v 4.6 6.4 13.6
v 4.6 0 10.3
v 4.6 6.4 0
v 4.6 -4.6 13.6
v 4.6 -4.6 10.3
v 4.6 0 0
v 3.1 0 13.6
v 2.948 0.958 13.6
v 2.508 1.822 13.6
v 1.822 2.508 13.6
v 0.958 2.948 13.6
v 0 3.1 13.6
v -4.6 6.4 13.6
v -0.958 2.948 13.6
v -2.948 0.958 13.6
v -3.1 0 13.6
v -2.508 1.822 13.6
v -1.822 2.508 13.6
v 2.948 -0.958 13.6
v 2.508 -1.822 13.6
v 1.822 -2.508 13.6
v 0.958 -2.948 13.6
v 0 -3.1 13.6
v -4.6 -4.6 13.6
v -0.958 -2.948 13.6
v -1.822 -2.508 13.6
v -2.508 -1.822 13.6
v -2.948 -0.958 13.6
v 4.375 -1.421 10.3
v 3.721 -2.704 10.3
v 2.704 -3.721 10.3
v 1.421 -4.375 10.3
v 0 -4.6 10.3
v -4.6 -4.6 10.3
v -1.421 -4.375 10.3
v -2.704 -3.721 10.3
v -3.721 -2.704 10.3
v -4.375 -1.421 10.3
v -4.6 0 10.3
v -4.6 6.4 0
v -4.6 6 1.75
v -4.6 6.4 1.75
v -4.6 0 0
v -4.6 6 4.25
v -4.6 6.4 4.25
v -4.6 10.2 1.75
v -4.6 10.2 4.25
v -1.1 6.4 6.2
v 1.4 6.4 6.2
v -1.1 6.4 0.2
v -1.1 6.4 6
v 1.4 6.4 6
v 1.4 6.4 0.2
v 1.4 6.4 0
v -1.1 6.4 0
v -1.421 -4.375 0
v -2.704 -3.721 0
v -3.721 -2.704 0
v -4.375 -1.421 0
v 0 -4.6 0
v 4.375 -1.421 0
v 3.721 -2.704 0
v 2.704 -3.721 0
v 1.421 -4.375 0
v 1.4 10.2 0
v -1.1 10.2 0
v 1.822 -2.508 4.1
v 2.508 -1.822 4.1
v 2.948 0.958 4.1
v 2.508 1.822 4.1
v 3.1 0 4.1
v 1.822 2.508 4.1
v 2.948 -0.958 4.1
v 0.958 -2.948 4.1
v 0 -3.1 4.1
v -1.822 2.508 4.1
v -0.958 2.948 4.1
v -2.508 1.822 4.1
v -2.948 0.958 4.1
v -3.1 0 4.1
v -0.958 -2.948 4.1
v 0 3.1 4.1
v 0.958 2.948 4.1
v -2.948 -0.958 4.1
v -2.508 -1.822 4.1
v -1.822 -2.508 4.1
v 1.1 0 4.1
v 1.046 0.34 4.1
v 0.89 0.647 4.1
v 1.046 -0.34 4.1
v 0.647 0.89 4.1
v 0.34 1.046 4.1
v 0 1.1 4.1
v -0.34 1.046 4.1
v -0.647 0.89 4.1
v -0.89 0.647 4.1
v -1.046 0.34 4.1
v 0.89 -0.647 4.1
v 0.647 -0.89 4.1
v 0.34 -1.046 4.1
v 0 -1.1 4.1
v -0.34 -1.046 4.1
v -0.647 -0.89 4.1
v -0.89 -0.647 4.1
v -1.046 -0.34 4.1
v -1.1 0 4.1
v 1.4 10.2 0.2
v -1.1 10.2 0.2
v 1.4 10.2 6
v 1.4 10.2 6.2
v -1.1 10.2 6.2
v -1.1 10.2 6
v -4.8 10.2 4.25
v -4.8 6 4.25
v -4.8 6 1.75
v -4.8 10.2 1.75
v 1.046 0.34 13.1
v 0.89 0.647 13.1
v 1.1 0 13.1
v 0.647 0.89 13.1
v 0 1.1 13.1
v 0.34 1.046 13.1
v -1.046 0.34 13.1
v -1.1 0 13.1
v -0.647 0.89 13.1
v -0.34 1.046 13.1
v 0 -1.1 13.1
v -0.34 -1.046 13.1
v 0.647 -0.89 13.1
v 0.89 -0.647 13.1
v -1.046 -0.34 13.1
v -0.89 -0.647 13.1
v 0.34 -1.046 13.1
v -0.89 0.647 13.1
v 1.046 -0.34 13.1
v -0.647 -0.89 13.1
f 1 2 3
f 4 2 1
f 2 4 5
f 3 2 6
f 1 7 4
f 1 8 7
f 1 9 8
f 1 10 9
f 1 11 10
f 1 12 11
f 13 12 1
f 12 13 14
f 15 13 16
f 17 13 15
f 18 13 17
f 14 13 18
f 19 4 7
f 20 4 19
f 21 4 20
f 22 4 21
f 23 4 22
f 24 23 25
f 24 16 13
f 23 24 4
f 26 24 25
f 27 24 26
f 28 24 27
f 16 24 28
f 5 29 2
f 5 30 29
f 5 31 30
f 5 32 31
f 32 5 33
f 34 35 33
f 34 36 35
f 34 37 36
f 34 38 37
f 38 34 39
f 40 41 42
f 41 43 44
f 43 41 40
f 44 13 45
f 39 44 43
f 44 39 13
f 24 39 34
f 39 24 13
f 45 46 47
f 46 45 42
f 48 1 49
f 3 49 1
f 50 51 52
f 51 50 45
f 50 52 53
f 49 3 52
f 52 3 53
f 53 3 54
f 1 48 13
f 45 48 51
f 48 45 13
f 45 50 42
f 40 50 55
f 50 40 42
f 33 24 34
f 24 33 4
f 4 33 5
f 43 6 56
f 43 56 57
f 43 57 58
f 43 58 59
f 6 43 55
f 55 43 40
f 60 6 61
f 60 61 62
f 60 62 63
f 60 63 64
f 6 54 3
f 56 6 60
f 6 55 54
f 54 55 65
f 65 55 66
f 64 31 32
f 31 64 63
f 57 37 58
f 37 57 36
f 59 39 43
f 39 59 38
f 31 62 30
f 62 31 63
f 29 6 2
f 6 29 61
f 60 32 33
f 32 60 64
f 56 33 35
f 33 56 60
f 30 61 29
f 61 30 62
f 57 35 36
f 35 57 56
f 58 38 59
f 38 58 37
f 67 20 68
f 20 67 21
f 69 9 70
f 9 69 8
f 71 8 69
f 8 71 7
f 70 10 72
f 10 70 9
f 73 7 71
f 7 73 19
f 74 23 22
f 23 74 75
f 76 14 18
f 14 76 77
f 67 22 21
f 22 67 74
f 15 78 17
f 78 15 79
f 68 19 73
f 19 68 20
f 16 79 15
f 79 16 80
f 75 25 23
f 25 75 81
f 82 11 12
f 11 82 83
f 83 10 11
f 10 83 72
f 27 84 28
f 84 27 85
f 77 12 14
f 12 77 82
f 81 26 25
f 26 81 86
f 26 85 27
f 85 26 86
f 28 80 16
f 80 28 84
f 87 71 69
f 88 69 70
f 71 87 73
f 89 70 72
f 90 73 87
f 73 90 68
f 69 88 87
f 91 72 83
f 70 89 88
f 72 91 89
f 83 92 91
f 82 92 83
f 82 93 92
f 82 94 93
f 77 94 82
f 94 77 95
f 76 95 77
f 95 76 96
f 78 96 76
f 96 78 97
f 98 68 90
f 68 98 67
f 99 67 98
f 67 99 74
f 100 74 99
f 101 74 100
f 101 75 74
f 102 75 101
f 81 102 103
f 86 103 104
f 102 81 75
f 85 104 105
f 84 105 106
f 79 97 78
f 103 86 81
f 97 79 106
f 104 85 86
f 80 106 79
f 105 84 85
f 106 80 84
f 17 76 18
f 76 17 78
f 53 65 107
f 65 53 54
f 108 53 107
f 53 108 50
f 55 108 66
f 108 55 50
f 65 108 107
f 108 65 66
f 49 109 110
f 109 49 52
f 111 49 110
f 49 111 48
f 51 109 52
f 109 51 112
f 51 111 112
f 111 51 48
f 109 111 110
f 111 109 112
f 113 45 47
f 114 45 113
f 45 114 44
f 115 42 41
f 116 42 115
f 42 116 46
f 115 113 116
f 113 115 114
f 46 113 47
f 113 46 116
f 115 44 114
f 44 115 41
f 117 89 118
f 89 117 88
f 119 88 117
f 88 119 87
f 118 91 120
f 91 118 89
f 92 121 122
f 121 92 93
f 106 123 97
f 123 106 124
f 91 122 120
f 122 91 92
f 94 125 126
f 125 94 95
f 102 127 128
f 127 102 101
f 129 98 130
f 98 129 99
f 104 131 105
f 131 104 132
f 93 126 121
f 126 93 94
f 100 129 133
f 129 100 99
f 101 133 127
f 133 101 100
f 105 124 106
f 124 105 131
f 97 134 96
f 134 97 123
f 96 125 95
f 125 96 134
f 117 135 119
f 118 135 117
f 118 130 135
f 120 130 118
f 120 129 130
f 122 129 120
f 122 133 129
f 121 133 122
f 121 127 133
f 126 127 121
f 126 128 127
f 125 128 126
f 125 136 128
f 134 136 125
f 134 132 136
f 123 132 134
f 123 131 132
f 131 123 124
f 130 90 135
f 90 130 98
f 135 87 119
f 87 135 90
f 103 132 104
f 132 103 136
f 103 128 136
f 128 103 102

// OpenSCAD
module barrelSocket6mm(){
    translate([-1.1,6,0]) color("white") cube([2.5,4.2,0.2]);
    translate([-1.1,6,6]) color("white") cube([2.5,4.2,0.2]);
    translate([-4.8,6,1.75]) color("white") cube([0.2,4.2,2.5]);
    translate([0,0,4.1]) color("white") cylinder(d=2.2,h=9,$fn=20);
    difference(){
        union(){
            translate([-4.6,-4.6,10.3]) cube([9.2,11,3.3]);
            translate([-4.6,0,0]) cube([9.2,6.4,13.6]);
            cylinder(d=9.2,h=13.6,$fn=20);
        }
            translate([0,0,4.1]) cylinder(d=6.2,h=9.6,$fn=20);
    }
}
barrelSocket6mm();
